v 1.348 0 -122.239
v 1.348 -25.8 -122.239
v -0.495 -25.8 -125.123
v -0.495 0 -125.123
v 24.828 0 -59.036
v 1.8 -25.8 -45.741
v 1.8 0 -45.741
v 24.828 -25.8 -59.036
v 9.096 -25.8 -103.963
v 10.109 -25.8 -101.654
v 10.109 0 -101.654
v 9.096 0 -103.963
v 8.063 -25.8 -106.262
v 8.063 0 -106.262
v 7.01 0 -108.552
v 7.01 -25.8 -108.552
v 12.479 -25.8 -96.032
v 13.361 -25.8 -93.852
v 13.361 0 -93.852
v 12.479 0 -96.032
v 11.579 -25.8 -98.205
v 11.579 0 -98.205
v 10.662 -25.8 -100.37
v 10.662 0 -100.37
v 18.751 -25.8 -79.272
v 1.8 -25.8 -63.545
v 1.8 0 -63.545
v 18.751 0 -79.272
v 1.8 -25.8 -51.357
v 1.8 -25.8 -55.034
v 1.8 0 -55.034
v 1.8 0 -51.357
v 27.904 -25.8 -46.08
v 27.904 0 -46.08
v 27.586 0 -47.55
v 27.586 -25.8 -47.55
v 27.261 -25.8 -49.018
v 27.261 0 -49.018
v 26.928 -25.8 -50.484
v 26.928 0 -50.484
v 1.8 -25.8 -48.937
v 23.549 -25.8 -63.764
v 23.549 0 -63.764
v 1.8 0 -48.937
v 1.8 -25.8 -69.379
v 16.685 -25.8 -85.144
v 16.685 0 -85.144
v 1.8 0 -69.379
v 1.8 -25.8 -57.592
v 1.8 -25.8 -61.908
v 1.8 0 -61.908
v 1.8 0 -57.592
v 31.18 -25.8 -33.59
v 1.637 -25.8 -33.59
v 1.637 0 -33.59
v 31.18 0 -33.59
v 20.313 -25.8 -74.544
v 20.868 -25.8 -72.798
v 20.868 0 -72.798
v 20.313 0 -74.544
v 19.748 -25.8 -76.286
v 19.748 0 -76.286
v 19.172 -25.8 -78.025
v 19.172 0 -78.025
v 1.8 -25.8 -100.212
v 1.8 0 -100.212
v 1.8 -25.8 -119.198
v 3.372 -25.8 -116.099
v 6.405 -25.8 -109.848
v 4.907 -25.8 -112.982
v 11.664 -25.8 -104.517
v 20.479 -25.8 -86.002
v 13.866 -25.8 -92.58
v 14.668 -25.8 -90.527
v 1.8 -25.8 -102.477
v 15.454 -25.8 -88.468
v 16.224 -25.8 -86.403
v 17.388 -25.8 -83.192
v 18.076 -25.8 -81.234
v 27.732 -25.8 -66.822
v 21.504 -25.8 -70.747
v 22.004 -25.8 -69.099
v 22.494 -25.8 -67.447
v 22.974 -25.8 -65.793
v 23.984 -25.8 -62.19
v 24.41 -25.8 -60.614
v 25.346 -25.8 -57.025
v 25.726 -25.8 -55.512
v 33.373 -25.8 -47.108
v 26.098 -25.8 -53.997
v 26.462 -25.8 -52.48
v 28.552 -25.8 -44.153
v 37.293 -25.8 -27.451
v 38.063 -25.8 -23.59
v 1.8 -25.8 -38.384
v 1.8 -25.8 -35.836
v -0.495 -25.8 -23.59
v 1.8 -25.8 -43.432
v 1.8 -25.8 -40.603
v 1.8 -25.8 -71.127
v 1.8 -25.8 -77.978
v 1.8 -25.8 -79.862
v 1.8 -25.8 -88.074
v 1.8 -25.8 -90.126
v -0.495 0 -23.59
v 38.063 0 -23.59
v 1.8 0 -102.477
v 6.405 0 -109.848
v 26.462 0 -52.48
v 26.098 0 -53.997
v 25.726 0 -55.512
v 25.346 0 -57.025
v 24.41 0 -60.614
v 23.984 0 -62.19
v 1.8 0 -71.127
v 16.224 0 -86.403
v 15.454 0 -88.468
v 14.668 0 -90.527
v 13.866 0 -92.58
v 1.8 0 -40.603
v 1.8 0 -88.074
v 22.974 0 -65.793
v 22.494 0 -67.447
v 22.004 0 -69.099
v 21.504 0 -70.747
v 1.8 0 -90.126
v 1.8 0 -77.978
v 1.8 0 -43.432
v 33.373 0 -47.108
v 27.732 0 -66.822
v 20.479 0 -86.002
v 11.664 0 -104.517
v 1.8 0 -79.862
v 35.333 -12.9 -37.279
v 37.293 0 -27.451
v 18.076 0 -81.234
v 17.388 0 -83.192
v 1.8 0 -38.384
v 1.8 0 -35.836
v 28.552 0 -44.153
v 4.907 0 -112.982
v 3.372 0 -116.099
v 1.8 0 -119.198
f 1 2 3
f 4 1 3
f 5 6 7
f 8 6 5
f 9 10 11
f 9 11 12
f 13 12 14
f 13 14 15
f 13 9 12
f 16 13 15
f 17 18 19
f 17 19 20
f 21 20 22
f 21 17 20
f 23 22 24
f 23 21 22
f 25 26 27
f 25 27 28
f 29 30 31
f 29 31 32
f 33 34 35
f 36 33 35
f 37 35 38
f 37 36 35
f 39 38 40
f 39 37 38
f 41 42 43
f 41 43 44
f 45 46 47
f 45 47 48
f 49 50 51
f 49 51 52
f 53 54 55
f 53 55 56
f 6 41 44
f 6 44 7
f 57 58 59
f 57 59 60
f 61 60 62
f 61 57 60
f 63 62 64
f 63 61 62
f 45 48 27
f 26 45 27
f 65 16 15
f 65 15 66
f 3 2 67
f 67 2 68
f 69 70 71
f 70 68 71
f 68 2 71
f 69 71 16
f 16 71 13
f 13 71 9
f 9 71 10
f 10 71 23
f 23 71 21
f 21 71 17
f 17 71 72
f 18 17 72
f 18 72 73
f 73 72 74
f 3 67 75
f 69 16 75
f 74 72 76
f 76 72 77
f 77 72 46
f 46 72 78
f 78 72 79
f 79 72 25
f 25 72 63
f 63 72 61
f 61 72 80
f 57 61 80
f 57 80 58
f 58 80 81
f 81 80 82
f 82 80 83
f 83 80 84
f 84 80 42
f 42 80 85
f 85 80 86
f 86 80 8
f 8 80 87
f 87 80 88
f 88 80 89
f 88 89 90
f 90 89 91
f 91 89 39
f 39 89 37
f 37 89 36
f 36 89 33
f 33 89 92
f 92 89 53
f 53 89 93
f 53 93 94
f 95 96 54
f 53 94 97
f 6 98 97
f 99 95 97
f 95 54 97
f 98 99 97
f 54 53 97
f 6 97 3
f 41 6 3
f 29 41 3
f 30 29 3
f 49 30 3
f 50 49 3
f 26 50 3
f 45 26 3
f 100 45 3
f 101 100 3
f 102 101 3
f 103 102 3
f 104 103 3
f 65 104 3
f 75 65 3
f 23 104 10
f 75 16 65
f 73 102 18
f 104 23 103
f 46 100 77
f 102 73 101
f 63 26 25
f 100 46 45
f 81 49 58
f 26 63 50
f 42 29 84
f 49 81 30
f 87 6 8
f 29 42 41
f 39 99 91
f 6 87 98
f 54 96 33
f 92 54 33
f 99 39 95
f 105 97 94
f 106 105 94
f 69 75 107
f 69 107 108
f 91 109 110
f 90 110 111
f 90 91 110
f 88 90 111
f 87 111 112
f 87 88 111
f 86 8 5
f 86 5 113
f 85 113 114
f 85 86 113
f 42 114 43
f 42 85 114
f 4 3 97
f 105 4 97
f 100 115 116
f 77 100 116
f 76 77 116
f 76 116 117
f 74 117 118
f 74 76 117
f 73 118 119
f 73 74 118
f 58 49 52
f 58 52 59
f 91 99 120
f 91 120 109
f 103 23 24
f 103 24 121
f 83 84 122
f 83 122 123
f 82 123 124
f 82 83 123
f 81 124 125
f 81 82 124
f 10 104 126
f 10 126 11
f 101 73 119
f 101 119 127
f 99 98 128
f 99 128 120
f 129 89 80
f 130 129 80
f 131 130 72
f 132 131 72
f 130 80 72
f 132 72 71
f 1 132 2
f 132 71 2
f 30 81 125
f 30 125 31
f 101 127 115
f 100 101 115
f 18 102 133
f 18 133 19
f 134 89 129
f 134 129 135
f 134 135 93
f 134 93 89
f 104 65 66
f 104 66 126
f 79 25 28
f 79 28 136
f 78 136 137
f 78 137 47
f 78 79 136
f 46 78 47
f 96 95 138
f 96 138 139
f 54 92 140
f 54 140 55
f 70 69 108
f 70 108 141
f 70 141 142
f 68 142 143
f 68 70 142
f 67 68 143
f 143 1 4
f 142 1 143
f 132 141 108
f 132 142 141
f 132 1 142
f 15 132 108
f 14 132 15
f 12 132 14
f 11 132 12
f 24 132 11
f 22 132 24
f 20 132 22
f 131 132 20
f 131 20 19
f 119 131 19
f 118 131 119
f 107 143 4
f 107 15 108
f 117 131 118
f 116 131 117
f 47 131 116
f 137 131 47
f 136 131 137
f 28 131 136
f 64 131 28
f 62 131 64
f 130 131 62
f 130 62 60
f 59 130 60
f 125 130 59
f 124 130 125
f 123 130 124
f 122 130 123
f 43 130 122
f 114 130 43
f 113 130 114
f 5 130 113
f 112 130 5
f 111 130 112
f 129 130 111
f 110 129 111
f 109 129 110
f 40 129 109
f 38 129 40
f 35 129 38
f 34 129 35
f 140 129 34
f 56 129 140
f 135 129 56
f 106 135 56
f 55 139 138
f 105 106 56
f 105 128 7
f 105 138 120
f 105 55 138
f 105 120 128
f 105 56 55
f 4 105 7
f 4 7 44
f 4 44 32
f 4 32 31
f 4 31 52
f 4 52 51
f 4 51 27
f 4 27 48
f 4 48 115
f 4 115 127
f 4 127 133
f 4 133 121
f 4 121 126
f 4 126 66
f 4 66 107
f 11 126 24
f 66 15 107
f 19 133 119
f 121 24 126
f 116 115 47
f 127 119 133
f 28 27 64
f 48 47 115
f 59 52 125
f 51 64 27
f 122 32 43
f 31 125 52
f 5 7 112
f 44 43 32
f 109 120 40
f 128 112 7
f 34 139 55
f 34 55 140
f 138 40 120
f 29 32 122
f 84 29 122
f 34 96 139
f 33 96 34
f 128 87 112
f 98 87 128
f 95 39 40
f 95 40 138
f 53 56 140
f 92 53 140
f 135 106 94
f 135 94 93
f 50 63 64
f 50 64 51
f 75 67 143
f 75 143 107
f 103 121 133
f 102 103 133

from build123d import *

# Parameters (mm, degrees)
BOSS_EXTRUDE1_DEPTH = 25.8


with BuildPart() as part:
    # Sketch1 → Boss-Extrude1 (new body)
    with BuildSketch(Plane.XZ.offset(25.8)):
        with BuildLine():
            Line((-0.494571956, -23.689779316), (-0.494571956, -23.589779316))
            Line((-0.494571956, -23.589779316), (-0.394571956, -23.589779316))
            Line((-0.394571956, -23.589779316), (33.993371563, -23.589779316))
            Line((33.993371563, -23.589779316), (38.063220374, -23.589779316))
            Line((38.063220374, -23.589779316), (37.29331502, -27.450677709))
            add(Edge.make_bspline(
                [(33.373472705, -47.107785962), (35.333393862, -37.279231836), (37.29331502, -27.450677709)],
                knots=[0, 0, 0, 1, 1, 1], degree=2))
            ThreePointArc((33.373472705, -47.107785962), (20.478962104, -86.002469597), (1.348099623, -122.238845235))
            Line((1.348099623, -122.238845235), (-0.494571956, -125.122735442))
            Line((-0.494571956, -125.122735442), (-0.494571956, -121.700417329))
            Line((-0.494571956, -121.700417329), (-0.494571956, -23.689779316))
        make_face()
        Polygon((1.636693568, -33.589779316), (31.180296724, -33.589779316), (28.552125449, -44.152877649), align=None, mode=Mode.SUBTRACT)
        with BuildLine():
            Line((1.8, -35.835600274), (27.903926427, -46.080219159))
            ThreePointArc((27.903926427, -46.080219159), (27.424243887, -48.283989571), (26.927669734, -50.484015362))
            Line((26.927669734, -50.484015362), (1.8, -38.383681926))
            Line((1.8, -38.383681926), (1.8, -35.835600274))
        make_face(mode=Mode.SUBTRACT)
        with BuildLine():
            Line((1.8, -40.603496686), (26.461878816, -52.479526576))
            ThreePointArc((26.461878816, -52.479526576), (25.912863392, -54.754715884), (25.345753049, -57.025462497))
            Line((25.345753049, -57.025462497), (1.8, -43.431924445))
            Line((1.8, -43.431924445), (1.8, -40.603496686))
        make_face(mode=Mode.SUBTRACT)
        with BuildLine():
            Line((1.8, -45.741299666), (24.827629624, -59.035712415))
            ThreePointArc((24.827629624, -59.035712415), (24.198120154, -61.402606851), (23.548915198, -63.764175052))
            Line((23.548915198, -63.764175052), (1.8, -48.936721812))
            Line((1.8, -48.936721812), (1.8, -45.741299666))
        make_face(mode=Mode.SUBTRACT)
        with BuildLine():
            Line((1.8, -51.35729301), (22.974243013, -65.792960045))
            ThreePointArc((22.974243013, -65.792960045), (22.250225593, -68.273323364), (21.504437212, -70.747227791))
            Line((21.504437212, -70.747227791), (1.8, -55.034267198))
            Line((1.8, -55.034267198), (1.8, -51.35729301))
        make_face(mode=Mode.SUBTRACT)
        with BuildLine():
            Line((1.8, -57.592312351), (20.868191148, -72.797909591))
            ThreePointArc((20.868191148, -72.797909591), (20.032066674, -75.415616602), (19.171511459, -78.02539415))
            Line((19.171511459, -78.02539415), (1.8, -61.907631839))
            Line((1.8, -61.907631839), (1.8, -57.592312351))
        make_face(mode=Mode.SUBTRACT)
        with BuildLine():
            Line((1.8, -63.544593475), (18.75085734, -79.272061417))
            ThreePointArc((18.75085734, -79.272061417), (17.733603559, -82.213523384), (16.685267787, -85.144051641))
            Line((16.685267787, -85.144051641), (1.8, -69.379364433))
            Line((1.8, -69.379364433), (1.8, -63.544593475))
        make_face(mode=Mode.SUBTRACT)
        with BuildLine():
            Line((1.8, -71.127270664), (16.223970717, -86.40340744))
            ThreePointArc((16.223970717, -86.40340744), (15.062552919, -89.498168213), (13.866413905, -92.579675475))
            Line((13.866413905, -92.579675475), (1.8, -77.977808183))
            Line((1.8, -77.977808183), (1.8, -71.127270664))
        make_face(mode=Mode.SUBTRACT)
        with BuildLine():
            Line((1.8, -79.861617911), (13.360943276, -93.851802636))
            ThreePointArc((13.360943276, -93.851802636), (12.031133738, -97.119012014), (10.66221999, -100.37003119))
            Line((10.66221999, -100.37003119), (1.8, -88.073893757))
            Line((1.8, -88.073893757), (1.8, -79.861617911))
        make_face(mode=Mode.SUBTRACT)
        with BuildLine():
            Line((1.8, -90.126243158), (10.108701369, -101.654385546))
            ThreePointArc((10.108701369, -101.654385546), (8.581699979, -105.113401186), (7.010340095, -108.552492716))
            Line((7.010340095, -108.552492716), (1.8, -100.212262217))
            Line((1.8, -100.212262217), (1.8, -90.126243158))
        make_face(mode=Mode.SUBTRACT)
        with BuildLine():
            Line((1.8, -102.47713769), (6.404592978, -109.847744231))
            ThreePointArc((6.404592978, -109.847744231), (4.143731804, -114.543136732), (1.8, -119.197717832))
            Line((1.8, -119.197717832), (1.8, -102.47713769))
        make_face(mode=Mode.SUBTRACT)
    extrude(amount=-BOSS_EXTRUDE1_DEPTH)


solid = part.part
